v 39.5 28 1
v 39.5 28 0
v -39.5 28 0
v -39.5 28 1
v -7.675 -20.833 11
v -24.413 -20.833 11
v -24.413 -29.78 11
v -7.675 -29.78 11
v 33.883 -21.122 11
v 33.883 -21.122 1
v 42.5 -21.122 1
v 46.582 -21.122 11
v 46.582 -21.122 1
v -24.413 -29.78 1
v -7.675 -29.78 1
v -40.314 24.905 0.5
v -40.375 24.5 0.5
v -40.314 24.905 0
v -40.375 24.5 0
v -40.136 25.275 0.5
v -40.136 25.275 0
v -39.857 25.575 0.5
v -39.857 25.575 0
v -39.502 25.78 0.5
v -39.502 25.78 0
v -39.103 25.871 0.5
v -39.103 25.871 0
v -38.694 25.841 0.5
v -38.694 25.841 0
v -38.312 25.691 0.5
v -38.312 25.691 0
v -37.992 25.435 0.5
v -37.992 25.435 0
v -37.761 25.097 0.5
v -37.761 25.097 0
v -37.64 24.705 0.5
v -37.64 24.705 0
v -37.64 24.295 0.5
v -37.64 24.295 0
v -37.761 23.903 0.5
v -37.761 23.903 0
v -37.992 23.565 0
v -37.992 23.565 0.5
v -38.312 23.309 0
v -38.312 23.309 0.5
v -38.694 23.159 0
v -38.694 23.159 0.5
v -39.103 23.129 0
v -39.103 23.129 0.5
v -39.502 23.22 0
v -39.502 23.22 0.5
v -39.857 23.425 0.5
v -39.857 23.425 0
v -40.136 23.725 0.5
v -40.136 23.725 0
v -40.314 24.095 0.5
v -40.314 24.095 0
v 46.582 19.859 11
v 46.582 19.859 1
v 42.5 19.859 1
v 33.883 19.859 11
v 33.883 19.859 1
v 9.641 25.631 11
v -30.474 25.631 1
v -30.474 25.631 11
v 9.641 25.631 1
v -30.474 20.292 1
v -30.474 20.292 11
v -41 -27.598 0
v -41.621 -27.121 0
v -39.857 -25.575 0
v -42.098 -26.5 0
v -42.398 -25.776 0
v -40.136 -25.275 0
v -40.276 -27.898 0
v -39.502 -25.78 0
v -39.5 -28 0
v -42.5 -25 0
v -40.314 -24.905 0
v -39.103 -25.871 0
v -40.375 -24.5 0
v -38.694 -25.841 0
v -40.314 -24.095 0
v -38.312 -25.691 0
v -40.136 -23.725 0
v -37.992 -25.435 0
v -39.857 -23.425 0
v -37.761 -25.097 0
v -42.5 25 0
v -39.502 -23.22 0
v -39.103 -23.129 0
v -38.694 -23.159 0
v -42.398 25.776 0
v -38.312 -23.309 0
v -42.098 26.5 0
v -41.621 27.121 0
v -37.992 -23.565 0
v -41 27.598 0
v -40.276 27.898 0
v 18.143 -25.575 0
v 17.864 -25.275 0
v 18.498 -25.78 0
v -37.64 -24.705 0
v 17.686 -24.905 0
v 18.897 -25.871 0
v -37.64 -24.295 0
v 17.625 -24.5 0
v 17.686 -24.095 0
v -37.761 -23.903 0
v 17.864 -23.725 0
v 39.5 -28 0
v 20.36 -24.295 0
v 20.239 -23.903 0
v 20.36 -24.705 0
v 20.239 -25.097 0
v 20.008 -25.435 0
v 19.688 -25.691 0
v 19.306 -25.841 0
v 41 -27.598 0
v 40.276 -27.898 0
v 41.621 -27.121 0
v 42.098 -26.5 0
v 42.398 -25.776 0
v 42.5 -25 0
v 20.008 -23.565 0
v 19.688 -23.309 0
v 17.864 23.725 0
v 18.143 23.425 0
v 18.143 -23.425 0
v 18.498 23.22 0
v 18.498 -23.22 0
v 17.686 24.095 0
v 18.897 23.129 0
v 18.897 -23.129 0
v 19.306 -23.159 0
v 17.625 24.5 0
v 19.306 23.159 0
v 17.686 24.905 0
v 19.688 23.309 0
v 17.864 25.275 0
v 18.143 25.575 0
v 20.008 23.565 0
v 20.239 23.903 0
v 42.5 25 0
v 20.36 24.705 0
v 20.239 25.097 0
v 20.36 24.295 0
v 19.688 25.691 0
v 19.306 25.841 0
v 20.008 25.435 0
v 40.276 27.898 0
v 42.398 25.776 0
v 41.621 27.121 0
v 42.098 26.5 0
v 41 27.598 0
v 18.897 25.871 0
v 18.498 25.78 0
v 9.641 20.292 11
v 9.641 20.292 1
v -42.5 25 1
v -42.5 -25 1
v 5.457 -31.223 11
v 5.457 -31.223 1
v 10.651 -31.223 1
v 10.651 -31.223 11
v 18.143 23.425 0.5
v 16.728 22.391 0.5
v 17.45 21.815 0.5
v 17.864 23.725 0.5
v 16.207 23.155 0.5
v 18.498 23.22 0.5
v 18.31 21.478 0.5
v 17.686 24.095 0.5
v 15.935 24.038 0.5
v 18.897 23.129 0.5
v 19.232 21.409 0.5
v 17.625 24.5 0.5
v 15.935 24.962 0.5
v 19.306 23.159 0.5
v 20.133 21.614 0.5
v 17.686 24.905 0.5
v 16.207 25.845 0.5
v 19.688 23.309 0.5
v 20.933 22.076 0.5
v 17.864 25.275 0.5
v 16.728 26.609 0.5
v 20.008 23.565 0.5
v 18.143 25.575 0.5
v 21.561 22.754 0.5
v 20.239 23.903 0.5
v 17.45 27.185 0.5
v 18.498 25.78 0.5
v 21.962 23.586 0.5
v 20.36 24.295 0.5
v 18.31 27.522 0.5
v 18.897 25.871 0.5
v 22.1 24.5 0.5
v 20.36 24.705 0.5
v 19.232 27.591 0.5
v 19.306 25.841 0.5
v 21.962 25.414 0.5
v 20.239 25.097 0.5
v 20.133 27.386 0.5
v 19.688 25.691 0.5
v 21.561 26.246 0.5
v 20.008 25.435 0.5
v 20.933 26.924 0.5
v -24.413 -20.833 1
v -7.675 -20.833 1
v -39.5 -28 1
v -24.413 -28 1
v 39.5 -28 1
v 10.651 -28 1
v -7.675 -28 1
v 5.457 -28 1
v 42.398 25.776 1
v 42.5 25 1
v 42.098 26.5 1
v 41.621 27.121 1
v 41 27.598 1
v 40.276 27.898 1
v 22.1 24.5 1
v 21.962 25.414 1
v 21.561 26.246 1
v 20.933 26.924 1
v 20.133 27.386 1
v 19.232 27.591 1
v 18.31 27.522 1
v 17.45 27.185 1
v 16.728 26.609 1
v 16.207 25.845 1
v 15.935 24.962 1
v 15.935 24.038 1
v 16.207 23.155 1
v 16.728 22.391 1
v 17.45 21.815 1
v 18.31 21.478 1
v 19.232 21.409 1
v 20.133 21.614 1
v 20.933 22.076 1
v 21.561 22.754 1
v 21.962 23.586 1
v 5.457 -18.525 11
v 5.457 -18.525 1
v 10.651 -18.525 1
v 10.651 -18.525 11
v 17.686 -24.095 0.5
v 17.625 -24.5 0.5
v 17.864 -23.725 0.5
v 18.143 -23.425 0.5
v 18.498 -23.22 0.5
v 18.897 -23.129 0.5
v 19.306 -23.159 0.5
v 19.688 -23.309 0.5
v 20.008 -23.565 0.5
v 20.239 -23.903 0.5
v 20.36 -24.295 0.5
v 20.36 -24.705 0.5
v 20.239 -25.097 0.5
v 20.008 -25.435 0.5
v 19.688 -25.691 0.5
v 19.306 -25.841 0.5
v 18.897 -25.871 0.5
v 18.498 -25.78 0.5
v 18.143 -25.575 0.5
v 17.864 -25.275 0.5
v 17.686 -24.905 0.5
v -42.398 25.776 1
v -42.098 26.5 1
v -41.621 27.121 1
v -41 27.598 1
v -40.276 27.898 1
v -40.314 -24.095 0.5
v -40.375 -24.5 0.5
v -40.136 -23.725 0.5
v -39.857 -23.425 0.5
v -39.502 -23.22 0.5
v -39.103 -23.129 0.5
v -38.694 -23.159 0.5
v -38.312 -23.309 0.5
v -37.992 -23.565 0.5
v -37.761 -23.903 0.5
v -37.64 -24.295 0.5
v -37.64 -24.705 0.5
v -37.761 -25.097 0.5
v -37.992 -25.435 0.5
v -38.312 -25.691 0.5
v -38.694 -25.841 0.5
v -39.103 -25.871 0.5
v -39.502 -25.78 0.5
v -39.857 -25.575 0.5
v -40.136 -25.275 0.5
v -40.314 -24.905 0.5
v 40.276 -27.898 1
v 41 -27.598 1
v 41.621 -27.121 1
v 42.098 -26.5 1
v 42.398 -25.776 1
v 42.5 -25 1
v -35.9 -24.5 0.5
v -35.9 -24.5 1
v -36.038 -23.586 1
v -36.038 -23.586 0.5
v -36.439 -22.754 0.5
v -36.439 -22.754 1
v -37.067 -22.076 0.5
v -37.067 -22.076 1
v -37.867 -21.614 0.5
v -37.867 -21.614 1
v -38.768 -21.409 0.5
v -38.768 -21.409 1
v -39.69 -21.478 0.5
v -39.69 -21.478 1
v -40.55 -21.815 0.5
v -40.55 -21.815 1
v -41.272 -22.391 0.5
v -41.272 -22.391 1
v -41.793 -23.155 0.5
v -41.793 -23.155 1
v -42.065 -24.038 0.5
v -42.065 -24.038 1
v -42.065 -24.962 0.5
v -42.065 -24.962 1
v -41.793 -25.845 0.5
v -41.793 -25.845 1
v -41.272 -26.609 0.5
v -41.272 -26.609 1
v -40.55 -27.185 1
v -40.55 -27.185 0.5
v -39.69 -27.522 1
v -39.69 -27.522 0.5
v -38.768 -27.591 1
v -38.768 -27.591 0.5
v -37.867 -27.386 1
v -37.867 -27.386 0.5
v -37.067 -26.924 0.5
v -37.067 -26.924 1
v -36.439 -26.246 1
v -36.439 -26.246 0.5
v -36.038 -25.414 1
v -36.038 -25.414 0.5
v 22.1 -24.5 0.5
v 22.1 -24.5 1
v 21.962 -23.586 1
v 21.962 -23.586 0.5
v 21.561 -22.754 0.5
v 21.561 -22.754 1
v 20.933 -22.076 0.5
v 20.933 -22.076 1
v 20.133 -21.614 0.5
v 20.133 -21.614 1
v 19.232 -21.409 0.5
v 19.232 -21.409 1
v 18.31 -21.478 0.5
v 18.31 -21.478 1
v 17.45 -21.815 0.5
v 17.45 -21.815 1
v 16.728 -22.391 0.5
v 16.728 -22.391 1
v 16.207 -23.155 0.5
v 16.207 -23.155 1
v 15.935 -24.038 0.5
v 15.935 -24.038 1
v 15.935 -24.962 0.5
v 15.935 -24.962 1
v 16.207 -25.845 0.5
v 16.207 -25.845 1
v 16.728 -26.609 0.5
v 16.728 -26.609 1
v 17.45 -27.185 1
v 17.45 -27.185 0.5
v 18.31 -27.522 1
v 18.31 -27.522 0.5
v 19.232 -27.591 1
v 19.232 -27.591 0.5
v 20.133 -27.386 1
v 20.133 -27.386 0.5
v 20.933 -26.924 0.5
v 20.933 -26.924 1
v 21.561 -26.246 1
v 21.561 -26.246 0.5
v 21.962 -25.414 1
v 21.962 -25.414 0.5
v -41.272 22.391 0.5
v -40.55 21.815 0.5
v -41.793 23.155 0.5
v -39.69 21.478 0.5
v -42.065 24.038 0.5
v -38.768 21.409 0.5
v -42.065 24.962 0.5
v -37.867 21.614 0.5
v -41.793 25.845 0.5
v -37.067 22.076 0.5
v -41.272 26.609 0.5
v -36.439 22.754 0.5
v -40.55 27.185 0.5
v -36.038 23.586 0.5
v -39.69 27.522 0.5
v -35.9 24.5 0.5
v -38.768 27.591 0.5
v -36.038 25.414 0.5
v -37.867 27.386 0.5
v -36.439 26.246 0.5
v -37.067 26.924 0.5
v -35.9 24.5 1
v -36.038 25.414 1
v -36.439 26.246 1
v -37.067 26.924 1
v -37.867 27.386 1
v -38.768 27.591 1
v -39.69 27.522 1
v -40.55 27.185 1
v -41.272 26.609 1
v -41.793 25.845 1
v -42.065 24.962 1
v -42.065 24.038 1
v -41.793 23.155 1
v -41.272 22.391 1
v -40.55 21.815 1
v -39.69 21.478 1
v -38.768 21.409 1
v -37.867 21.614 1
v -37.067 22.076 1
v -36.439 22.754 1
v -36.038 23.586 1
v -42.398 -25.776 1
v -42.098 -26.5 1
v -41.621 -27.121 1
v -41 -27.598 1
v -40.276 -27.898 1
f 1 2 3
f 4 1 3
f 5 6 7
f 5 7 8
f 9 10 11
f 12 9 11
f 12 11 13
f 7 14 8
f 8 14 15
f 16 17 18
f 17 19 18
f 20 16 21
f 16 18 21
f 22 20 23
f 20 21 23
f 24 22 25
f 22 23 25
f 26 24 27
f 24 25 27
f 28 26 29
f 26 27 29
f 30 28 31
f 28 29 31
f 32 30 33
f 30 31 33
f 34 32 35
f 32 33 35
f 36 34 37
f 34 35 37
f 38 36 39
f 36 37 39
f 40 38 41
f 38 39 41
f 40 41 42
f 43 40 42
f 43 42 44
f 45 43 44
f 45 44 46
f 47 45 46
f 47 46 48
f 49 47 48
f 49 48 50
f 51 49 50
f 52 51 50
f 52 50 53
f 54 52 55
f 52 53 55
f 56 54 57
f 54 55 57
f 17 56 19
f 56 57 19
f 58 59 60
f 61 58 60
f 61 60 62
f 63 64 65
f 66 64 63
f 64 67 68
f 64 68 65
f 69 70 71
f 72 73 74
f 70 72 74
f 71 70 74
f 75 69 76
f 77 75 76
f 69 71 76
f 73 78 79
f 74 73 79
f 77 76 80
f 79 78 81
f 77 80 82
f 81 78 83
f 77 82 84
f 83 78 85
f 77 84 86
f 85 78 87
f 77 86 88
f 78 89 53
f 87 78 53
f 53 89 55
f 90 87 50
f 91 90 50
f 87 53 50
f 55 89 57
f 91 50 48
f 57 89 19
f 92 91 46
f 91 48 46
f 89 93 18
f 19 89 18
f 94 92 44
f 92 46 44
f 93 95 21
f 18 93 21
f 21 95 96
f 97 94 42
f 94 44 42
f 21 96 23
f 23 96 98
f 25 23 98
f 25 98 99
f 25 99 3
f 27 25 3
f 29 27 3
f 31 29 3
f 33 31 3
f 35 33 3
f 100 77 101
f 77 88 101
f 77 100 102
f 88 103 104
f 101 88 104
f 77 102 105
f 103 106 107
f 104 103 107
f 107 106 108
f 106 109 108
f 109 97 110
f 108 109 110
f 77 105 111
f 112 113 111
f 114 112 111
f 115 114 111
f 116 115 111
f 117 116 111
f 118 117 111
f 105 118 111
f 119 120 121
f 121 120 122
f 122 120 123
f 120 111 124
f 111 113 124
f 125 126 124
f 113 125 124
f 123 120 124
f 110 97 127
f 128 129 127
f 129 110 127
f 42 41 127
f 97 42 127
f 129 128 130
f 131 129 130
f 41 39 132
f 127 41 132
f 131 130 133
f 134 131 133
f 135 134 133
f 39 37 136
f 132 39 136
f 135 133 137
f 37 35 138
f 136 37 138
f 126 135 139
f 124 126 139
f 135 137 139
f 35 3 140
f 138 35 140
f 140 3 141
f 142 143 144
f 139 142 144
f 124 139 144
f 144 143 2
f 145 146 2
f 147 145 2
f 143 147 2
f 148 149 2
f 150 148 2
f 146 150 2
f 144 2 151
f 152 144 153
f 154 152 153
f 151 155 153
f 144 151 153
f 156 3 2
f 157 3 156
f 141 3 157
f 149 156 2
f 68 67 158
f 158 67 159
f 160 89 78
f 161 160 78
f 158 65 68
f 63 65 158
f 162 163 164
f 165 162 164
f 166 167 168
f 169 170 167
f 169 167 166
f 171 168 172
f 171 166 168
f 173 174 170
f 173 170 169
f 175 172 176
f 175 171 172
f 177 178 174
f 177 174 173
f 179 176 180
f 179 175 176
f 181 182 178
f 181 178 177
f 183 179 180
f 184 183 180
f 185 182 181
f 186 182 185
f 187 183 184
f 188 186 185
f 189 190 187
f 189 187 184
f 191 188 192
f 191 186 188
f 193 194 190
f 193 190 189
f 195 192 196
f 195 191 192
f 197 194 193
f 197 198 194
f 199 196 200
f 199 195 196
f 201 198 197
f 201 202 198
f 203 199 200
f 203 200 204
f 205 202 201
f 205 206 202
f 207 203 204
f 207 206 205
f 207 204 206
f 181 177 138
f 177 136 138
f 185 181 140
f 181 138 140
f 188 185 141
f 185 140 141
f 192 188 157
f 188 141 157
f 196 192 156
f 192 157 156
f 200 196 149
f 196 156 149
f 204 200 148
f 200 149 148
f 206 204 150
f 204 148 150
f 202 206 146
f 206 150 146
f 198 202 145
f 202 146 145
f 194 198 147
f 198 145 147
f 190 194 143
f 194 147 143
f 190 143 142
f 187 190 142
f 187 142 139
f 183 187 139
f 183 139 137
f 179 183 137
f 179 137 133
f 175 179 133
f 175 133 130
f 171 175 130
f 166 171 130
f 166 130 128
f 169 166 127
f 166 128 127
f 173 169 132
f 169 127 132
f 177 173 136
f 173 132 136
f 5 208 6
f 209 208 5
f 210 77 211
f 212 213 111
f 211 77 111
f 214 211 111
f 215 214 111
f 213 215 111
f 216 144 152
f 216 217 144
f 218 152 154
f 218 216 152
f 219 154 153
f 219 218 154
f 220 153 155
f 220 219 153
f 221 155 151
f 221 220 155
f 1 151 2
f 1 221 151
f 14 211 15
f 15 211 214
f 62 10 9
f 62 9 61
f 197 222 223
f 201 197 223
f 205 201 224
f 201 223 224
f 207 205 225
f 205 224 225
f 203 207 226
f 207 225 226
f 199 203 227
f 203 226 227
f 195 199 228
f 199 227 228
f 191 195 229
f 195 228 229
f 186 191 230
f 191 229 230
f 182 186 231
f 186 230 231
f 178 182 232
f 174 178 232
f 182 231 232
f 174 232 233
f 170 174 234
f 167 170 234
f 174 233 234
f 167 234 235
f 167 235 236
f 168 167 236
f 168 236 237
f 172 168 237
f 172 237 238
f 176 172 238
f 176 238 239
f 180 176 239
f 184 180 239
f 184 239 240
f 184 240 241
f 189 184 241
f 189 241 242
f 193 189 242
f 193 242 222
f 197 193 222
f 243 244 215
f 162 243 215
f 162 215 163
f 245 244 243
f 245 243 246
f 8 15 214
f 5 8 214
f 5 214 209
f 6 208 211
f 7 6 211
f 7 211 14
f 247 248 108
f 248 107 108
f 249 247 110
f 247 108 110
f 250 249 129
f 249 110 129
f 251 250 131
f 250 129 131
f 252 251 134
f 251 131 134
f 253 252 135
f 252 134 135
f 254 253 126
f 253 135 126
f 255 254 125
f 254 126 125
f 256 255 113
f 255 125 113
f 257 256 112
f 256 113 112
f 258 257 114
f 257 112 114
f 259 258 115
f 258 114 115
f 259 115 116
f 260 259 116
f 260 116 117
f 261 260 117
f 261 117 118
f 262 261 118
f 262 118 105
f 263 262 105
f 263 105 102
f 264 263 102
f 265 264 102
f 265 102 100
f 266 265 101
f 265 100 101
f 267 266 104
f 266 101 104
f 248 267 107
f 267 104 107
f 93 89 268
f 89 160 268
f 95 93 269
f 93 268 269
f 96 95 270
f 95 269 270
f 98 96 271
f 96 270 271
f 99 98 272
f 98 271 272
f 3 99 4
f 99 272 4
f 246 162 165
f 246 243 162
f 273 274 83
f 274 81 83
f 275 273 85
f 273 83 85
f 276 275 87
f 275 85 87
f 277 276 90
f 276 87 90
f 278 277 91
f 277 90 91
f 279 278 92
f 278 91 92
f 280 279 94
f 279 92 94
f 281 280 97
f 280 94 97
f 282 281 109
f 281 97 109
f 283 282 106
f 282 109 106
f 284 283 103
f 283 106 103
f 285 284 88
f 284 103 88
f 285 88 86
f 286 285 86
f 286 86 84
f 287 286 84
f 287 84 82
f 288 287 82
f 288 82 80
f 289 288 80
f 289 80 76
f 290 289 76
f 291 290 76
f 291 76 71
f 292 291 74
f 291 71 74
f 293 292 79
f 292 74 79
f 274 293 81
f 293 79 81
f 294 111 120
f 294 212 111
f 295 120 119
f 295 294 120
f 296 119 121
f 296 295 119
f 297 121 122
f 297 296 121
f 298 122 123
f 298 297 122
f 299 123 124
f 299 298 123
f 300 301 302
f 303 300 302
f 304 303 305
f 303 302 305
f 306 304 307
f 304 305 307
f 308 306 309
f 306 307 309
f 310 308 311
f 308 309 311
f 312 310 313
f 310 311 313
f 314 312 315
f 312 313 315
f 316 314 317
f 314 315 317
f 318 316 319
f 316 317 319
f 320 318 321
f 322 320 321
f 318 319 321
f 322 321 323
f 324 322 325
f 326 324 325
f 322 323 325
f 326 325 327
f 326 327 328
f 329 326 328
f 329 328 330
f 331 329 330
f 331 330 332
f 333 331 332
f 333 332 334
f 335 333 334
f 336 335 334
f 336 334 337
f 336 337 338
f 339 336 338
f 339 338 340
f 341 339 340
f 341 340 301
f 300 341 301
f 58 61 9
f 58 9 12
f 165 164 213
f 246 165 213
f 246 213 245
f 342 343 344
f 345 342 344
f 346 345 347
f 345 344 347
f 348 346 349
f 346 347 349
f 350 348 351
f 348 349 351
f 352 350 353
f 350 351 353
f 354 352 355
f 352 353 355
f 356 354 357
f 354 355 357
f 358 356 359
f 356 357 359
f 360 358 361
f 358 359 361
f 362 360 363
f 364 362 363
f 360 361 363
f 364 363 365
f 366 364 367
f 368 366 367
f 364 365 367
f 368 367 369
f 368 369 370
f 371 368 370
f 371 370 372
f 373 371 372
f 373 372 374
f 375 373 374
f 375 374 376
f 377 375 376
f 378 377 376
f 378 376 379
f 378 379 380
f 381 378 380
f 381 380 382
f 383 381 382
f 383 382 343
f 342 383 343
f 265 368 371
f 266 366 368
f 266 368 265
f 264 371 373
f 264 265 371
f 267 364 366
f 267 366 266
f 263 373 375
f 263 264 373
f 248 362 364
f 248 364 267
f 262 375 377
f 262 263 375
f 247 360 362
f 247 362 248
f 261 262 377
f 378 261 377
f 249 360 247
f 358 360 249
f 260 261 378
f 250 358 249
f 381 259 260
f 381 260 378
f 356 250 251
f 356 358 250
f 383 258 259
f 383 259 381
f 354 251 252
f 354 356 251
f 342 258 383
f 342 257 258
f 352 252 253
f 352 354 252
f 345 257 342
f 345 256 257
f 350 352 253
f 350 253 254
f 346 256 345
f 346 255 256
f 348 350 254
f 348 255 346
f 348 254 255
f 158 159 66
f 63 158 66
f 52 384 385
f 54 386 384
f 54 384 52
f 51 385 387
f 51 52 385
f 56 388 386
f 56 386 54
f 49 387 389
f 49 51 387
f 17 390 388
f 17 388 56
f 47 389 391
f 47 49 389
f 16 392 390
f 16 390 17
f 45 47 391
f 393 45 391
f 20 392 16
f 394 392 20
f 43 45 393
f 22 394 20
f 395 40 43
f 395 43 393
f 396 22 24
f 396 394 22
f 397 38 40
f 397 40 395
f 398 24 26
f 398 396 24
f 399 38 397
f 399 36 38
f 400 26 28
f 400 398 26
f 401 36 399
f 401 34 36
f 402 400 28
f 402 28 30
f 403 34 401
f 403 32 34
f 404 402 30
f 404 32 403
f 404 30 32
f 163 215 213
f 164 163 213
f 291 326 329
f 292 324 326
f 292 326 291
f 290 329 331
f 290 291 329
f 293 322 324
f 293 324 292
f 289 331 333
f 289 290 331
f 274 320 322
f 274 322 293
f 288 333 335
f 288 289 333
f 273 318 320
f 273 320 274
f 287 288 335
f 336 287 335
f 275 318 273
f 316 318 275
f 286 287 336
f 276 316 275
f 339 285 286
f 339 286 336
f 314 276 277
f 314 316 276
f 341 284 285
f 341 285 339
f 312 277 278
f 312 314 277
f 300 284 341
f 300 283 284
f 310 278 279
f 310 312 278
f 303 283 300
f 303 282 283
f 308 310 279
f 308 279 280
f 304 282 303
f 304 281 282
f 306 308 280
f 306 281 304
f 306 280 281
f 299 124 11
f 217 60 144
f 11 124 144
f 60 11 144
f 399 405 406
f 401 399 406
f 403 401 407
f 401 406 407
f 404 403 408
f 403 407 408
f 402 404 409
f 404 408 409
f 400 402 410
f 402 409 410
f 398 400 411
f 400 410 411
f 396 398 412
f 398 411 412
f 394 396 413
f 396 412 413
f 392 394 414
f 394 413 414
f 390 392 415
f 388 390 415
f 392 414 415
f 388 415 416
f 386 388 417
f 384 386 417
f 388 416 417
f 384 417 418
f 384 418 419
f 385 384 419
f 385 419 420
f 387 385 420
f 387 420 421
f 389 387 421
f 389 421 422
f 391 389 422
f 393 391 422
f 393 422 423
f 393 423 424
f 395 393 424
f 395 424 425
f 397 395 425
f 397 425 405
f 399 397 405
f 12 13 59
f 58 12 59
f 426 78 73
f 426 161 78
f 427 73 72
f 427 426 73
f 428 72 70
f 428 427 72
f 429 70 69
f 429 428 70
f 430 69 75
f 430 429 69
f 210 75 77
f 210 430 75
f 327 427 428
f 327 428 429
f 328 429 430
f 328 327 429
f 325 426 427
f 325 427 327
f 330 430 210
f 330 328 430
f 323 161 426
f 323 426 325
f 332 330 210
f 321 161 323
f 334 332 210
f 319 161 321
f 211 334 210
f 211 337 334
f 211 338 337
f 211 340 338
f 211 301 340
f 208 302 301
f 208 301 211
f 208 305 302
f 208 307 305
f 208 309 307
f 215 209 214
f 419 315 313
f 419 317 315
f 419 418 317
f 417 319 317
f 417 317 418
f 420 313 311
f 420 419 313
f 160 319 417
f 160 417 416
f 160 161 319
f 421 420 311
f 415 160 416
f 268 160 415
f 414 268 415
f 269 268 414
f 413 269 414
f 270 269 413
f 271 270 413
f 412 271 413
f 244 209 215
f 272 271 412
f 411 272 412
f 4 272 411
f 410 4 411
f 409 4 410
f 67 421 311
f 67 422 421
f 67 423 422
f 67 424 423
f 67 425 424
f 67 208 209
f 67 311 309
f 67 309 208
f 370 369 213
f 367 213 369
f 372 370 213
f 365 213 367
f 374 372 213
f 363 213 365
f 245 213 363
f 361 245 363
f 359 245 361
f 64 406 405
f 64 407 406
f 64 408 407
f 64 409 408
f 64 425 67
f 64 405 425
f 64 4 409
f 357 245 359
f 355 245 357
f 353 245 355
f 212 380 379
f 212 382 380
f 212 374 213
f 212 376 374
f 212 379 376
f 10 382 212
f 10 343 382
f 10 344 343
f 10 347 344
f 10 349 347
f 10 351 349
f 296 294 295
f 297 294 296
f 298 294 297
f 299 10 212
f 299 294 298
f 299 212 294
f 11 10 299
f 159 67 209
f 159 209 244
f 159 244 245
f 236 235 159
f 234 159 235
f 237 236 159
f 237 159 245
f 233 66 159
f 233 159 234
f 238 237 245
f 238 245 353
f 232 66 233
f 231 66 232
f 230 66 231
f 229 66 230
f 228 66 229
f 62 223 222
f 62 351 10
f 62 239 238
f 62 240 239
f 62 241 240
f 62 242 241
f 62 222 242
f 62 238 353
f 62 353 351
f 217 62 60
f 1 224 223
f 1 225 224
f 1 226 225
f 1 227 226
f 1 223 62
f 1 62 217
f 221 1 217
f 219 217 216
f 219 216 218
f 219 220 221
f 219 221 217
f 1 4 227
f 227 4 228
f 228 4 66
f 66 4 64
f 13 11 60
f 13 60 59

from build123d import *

# Parameters (mm, degrees)
F1_DEPTH       = 1
F2_R           = 3
F4_D           = 2.75
F4_CBORE_D     = 6.2
F4_CBORE_DEPTH = 0.5
F5_W           = 40.115128
F5_H           = 5.339066
F5_W_2         = 8.616518
F5_H_2         = 40.98092
F5_W_3         = 4.081794
F5_W_4         = 16.738685
F5_H_3         = 7.16661
F5_H_4         = 1.77993
F5_W_5         = 5.194765
F5_H_5         = 9.475394
F5_H_6         = 3.222921
F6_DEPTH       = 10


with BuildPart() as f1:
    # F0 (on Top) → F1 (new body)
    with BuildSketch(Plane.XY):
        Polygon((42.5, -28), (-42.5, 28), (-42.5, -28), align=None)
        Polygon((42.5, 28), (-42.5, 28), (42.5, -28), align=None)
    extrude(amount=F1_DEPTH)

    # F2
    f2_edges = [f1.edges().sort_by_distance(p)[0] for p in [
        (-42.5, -28, 0.5),
        (-42.5, 28, 0.5),
        (42.5, -28, 0.5),
        (42.5, 28, 0.5),
    ]]
    fillet(f2_edges, radius=F2_R)

    # F4 (through all)
    with Locations(Plane.XY.offset(1)):
        with Locations((-39, 24.5), (-39, -24.5), (19, -24.5), (19, 24.5)):
            CounterBoreHole(F4_D / 2, F4_CBORE_D / 2, F4_CBORE_DEPTH)

    # F5 (on face) → F6 (join)
    with BuildSketch(Plane.XY.offset(1)):
        with Locations((-10.416318, 22.961362)):
            Rectangle(F5_W, F5_H)
        with Locations((38.191741, -0.631528)):
            Rectangle(F5_W_2, F5_H_2)
        with Locations((44.540897, -0.631528)):
            Rectangle(F5_W_3, F5_H_2)
        with Locations((-16.04398, -24.416695)):
            Rectangle(F5_W_4, F5_H_3)
        with Locations((-16.04398, -28.889965)):
            Rectangle(F5_W_4, F5_H_4)
        with Locations((8.053955, -23.262303)):
            Rectangle(F5_W_5, F5_H_5)
        with Locations((8.053955, -29.61146)):
            Rectangle(F5_W_5, F5_H_6)
    extrude(amount=F6_DEPTH)


solid = f1.part
